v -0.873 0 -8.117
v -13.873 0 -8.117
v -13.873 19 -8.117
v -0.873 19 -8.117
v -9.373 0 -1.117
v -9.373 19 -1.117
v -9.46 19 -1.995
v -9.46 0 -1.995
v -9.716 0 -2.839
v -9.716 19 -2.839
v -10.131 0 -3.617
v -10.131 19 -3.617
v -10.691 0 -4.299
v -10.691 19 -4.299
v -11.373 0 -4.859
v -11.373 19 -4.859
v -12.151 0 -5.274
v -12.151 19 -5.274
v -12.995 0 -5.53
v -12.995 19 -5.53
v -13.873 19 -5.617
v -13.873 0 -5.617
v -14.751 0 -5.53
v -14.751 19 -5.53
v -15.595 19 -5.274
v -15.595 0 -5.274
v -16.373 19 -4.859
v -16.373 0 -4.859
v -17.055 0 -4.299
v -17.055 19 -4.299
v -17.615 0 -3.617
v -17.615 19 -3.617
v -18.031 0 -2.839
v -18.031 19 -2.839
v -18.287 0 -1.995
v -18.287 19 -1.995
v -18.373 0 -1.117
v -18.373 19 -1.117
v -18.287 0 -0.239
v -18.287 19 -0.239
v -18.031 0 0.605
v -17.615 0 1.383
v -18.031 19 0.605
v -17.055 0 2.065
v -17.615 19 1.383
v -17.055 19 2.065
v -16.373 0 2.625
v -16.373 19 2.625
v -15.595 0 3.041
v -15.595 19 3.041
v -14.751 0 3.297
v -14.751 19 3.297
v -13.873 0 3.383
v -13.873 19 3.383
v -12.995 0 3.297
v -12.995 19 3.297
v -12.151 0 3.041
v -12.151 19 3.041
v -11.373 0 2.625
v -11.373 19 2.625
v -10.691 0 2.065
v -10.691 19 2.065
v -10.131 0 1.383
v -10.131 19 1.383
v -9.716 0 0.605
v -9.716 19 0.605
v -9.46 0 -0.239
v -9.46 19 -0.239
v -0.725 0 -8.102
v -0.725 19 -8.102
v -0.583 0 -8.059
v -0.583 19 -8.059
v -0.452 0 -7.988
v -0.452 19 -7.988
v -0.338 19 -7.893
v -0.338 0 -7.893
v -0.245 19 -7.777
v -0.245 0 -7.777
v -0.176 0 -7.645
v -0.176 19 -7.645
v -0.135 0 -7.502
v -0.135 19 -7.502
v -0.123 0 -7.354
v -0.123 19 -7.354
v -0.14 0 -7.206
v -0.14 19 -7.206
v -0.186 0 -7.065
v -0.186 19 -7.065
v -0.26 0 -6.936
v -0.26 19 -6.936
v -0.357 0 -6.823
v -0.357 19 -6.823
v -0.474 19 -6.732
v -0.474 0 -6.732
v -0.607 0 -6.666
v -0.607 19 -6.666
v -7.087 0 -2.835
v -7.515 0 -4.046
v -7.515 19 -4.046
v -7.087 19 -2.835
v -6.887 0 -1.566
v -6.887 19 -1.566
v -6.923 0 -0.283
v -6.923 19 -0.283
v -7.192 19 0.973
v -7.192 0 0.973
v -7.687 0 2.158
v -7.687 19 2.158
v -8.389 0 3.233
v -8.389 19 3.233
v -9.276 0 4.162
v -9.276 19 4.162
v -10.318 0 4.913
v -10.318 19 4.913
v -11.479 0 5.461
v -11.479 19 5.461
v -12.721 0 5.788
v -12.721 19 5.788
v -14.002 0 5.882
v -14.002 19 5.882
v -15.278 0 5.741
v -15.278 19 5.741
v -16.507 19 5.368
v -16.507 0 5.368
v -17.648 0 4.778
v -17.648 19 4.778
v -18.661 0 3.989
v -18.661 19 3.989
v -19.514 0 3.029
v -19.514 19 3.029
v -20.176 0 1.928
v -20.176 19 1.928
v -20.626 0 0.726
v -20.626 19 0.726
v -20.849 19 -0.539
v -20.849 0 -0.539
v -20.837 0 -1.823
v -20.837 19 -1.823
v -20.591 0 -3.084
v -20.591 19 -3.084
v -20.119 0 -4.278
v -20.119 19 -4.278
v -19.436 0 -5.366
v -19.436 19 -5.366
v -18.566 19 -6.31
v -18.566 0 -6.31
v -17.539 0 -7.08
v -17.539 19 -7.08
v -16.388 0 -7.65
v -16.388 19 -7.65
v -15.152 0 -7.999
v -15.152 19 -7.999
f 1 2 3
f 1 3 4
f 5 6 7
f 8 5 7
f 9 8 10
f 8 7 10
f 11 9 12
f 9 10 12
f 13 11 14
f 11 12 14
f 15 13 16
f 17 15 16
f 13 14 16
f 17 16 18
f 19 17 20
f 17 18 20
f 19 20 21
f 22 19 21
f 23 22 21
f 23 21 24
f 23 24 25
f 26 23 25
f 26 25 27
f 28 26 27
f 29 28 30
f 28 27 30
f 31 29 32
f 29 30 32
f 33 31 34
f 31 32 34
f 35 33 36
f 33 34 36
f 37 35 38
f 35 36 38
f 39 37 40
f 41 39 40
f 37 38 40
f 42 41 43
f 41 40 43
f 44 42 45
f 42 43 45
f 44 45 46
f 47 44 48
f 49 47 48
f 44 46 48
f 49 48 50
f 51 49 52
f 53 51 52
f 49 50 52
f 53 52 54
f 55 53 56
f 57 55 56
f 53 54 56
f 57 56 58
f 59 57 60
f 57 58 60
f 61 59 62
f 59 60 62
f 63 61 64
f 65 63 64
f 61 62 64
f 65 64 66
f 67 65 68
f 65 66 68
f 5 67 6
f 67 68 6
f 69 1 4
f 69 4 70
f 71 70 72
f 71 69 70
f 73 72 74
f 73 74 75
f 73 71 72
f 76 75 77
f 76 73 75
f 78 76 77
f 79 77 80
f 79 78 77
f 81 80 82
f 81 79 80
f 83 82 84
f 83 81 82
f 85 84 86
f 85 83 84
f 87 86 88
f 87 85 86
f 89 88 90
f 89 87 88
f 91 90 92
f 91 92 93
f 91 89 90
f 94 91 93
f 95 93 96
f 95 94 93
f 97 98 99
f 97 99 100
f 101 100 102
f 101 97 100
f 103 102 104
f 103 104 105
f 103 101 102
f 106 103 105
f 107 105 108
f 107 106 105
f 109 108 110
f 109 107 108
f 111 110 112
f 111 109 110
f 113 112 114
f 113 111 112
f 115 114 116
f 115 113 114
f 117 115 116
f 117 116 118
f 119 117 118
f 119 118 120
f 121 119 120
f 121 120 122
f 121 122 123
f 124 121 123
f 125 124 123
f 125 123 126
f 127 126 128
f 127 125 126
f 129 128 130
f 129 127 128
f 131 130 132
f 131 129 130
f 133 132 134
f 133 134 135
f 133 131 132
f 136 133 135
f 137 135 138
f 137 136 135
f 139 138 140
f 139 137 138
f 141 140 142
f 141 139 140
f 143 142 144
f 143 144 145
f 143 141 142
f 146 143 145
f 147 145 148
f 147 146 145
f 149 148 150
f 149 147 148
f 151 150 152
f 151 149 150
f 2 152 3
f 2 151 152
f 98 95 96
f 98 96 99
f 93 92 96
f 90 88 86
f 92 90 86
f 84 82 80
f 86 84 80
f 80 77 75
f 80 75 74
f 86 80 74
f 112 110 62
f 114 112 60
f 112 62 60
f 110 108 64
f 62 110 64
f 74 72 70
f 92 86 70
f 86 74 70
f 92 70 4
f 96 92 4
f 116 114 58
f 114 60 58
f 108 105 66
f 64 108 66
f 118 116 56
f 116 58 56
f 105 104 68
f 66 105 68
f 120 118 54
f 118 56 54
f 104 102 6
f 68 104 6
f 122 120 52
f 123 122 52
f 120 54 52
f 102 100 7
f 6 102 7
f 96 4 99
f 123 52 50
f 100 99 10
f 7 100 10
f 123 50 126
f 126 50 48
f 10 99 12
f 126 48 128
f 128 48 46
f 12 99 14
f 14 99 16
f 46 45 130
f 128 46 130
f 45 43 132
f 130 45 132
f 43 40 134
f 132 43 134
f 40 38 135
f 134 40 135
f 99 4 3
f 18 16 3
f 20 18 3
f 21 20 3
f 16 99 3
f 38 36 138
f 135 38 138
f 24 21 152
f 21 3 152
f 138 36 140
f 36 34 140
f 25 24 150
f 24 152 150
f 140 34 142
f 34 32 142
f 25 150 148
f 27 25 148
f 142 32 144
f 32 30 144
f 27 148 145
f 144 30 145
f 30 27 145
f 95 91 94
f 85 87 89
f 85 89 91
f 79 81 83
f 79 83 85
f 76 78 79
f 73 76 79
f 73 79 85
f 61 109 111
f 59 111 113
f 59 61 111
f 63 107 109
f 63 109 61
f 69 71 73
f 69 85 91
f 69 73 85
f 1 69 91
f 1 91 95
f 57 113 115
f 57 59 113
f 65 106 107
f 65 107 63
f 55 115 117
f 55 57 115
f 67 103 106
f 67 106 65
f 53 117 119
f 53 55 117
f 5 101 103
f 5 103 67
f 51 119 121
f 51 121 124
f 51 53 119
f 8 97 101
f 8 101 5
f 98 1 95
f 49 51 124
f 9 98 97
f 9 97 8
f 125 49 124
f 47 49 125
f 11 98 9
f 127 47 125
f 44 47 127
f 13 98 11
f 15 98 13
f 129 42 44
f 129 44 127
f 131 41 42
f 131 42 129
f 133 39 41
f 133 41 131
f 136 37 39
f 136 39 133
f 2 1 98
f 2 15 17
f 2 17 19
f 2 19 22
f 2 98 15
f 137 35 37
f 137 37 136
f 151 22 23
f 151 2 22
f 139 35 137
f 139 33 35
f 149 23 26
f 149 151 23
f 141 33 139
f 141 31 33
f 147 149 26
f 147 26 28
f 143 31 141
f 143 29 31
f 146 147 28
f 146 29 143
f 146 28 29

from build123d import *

# Parameters (mm, degrees)
SALIENTE_EXTRUIR1_DEPTH = 19
CROQUIS3_R              = 4.5
CORTAR_EXTRUIR1_DEPTH   = 19


with BuildPart() as part:
    # Croquis2 → Saliente-Extruir1 (new body)
    with BuildSketch(Plane(origin=(0, 0, 0), x_dir=(1, 0, 0), z_dir=(0, 1, 0))):
        with BuildLine():
            Line((-13.873049235, 8.116898032), (-0.873049235, 8.116898032))
            ThreePointArc((-0.873049235, 8.116898032), (-0.135335411, 7.502095351), (-0.607084084, 6.665640205))
            Line((-0.607084084, 6.665640205), (-7.515172482, 4.045618436))
            ThreePointArc((-7.515172482, 4.045618436), (-17.647897389, -4.778059255), (-13.873049235, 8.116898032))
        make_face()
    extrude(amount=SALIENTE_EXTRUIR1_DEPTH)

    # Croquis3 → Cortar-Extruir1 (cut)
    with BuildSketch(Plane(origin=(0, 19, 0), x_dir=(1, 0, 0), z_dir=(0, 1, 0))):
        with Locations((-13.873049235, 1.116898032)):
            Circle(CROQUIS3_R)
    extrude(amount=-CORTAR_EXTRUIR1_DEPTH, mode=Mode.SUBTRACT)


solid = part.part
